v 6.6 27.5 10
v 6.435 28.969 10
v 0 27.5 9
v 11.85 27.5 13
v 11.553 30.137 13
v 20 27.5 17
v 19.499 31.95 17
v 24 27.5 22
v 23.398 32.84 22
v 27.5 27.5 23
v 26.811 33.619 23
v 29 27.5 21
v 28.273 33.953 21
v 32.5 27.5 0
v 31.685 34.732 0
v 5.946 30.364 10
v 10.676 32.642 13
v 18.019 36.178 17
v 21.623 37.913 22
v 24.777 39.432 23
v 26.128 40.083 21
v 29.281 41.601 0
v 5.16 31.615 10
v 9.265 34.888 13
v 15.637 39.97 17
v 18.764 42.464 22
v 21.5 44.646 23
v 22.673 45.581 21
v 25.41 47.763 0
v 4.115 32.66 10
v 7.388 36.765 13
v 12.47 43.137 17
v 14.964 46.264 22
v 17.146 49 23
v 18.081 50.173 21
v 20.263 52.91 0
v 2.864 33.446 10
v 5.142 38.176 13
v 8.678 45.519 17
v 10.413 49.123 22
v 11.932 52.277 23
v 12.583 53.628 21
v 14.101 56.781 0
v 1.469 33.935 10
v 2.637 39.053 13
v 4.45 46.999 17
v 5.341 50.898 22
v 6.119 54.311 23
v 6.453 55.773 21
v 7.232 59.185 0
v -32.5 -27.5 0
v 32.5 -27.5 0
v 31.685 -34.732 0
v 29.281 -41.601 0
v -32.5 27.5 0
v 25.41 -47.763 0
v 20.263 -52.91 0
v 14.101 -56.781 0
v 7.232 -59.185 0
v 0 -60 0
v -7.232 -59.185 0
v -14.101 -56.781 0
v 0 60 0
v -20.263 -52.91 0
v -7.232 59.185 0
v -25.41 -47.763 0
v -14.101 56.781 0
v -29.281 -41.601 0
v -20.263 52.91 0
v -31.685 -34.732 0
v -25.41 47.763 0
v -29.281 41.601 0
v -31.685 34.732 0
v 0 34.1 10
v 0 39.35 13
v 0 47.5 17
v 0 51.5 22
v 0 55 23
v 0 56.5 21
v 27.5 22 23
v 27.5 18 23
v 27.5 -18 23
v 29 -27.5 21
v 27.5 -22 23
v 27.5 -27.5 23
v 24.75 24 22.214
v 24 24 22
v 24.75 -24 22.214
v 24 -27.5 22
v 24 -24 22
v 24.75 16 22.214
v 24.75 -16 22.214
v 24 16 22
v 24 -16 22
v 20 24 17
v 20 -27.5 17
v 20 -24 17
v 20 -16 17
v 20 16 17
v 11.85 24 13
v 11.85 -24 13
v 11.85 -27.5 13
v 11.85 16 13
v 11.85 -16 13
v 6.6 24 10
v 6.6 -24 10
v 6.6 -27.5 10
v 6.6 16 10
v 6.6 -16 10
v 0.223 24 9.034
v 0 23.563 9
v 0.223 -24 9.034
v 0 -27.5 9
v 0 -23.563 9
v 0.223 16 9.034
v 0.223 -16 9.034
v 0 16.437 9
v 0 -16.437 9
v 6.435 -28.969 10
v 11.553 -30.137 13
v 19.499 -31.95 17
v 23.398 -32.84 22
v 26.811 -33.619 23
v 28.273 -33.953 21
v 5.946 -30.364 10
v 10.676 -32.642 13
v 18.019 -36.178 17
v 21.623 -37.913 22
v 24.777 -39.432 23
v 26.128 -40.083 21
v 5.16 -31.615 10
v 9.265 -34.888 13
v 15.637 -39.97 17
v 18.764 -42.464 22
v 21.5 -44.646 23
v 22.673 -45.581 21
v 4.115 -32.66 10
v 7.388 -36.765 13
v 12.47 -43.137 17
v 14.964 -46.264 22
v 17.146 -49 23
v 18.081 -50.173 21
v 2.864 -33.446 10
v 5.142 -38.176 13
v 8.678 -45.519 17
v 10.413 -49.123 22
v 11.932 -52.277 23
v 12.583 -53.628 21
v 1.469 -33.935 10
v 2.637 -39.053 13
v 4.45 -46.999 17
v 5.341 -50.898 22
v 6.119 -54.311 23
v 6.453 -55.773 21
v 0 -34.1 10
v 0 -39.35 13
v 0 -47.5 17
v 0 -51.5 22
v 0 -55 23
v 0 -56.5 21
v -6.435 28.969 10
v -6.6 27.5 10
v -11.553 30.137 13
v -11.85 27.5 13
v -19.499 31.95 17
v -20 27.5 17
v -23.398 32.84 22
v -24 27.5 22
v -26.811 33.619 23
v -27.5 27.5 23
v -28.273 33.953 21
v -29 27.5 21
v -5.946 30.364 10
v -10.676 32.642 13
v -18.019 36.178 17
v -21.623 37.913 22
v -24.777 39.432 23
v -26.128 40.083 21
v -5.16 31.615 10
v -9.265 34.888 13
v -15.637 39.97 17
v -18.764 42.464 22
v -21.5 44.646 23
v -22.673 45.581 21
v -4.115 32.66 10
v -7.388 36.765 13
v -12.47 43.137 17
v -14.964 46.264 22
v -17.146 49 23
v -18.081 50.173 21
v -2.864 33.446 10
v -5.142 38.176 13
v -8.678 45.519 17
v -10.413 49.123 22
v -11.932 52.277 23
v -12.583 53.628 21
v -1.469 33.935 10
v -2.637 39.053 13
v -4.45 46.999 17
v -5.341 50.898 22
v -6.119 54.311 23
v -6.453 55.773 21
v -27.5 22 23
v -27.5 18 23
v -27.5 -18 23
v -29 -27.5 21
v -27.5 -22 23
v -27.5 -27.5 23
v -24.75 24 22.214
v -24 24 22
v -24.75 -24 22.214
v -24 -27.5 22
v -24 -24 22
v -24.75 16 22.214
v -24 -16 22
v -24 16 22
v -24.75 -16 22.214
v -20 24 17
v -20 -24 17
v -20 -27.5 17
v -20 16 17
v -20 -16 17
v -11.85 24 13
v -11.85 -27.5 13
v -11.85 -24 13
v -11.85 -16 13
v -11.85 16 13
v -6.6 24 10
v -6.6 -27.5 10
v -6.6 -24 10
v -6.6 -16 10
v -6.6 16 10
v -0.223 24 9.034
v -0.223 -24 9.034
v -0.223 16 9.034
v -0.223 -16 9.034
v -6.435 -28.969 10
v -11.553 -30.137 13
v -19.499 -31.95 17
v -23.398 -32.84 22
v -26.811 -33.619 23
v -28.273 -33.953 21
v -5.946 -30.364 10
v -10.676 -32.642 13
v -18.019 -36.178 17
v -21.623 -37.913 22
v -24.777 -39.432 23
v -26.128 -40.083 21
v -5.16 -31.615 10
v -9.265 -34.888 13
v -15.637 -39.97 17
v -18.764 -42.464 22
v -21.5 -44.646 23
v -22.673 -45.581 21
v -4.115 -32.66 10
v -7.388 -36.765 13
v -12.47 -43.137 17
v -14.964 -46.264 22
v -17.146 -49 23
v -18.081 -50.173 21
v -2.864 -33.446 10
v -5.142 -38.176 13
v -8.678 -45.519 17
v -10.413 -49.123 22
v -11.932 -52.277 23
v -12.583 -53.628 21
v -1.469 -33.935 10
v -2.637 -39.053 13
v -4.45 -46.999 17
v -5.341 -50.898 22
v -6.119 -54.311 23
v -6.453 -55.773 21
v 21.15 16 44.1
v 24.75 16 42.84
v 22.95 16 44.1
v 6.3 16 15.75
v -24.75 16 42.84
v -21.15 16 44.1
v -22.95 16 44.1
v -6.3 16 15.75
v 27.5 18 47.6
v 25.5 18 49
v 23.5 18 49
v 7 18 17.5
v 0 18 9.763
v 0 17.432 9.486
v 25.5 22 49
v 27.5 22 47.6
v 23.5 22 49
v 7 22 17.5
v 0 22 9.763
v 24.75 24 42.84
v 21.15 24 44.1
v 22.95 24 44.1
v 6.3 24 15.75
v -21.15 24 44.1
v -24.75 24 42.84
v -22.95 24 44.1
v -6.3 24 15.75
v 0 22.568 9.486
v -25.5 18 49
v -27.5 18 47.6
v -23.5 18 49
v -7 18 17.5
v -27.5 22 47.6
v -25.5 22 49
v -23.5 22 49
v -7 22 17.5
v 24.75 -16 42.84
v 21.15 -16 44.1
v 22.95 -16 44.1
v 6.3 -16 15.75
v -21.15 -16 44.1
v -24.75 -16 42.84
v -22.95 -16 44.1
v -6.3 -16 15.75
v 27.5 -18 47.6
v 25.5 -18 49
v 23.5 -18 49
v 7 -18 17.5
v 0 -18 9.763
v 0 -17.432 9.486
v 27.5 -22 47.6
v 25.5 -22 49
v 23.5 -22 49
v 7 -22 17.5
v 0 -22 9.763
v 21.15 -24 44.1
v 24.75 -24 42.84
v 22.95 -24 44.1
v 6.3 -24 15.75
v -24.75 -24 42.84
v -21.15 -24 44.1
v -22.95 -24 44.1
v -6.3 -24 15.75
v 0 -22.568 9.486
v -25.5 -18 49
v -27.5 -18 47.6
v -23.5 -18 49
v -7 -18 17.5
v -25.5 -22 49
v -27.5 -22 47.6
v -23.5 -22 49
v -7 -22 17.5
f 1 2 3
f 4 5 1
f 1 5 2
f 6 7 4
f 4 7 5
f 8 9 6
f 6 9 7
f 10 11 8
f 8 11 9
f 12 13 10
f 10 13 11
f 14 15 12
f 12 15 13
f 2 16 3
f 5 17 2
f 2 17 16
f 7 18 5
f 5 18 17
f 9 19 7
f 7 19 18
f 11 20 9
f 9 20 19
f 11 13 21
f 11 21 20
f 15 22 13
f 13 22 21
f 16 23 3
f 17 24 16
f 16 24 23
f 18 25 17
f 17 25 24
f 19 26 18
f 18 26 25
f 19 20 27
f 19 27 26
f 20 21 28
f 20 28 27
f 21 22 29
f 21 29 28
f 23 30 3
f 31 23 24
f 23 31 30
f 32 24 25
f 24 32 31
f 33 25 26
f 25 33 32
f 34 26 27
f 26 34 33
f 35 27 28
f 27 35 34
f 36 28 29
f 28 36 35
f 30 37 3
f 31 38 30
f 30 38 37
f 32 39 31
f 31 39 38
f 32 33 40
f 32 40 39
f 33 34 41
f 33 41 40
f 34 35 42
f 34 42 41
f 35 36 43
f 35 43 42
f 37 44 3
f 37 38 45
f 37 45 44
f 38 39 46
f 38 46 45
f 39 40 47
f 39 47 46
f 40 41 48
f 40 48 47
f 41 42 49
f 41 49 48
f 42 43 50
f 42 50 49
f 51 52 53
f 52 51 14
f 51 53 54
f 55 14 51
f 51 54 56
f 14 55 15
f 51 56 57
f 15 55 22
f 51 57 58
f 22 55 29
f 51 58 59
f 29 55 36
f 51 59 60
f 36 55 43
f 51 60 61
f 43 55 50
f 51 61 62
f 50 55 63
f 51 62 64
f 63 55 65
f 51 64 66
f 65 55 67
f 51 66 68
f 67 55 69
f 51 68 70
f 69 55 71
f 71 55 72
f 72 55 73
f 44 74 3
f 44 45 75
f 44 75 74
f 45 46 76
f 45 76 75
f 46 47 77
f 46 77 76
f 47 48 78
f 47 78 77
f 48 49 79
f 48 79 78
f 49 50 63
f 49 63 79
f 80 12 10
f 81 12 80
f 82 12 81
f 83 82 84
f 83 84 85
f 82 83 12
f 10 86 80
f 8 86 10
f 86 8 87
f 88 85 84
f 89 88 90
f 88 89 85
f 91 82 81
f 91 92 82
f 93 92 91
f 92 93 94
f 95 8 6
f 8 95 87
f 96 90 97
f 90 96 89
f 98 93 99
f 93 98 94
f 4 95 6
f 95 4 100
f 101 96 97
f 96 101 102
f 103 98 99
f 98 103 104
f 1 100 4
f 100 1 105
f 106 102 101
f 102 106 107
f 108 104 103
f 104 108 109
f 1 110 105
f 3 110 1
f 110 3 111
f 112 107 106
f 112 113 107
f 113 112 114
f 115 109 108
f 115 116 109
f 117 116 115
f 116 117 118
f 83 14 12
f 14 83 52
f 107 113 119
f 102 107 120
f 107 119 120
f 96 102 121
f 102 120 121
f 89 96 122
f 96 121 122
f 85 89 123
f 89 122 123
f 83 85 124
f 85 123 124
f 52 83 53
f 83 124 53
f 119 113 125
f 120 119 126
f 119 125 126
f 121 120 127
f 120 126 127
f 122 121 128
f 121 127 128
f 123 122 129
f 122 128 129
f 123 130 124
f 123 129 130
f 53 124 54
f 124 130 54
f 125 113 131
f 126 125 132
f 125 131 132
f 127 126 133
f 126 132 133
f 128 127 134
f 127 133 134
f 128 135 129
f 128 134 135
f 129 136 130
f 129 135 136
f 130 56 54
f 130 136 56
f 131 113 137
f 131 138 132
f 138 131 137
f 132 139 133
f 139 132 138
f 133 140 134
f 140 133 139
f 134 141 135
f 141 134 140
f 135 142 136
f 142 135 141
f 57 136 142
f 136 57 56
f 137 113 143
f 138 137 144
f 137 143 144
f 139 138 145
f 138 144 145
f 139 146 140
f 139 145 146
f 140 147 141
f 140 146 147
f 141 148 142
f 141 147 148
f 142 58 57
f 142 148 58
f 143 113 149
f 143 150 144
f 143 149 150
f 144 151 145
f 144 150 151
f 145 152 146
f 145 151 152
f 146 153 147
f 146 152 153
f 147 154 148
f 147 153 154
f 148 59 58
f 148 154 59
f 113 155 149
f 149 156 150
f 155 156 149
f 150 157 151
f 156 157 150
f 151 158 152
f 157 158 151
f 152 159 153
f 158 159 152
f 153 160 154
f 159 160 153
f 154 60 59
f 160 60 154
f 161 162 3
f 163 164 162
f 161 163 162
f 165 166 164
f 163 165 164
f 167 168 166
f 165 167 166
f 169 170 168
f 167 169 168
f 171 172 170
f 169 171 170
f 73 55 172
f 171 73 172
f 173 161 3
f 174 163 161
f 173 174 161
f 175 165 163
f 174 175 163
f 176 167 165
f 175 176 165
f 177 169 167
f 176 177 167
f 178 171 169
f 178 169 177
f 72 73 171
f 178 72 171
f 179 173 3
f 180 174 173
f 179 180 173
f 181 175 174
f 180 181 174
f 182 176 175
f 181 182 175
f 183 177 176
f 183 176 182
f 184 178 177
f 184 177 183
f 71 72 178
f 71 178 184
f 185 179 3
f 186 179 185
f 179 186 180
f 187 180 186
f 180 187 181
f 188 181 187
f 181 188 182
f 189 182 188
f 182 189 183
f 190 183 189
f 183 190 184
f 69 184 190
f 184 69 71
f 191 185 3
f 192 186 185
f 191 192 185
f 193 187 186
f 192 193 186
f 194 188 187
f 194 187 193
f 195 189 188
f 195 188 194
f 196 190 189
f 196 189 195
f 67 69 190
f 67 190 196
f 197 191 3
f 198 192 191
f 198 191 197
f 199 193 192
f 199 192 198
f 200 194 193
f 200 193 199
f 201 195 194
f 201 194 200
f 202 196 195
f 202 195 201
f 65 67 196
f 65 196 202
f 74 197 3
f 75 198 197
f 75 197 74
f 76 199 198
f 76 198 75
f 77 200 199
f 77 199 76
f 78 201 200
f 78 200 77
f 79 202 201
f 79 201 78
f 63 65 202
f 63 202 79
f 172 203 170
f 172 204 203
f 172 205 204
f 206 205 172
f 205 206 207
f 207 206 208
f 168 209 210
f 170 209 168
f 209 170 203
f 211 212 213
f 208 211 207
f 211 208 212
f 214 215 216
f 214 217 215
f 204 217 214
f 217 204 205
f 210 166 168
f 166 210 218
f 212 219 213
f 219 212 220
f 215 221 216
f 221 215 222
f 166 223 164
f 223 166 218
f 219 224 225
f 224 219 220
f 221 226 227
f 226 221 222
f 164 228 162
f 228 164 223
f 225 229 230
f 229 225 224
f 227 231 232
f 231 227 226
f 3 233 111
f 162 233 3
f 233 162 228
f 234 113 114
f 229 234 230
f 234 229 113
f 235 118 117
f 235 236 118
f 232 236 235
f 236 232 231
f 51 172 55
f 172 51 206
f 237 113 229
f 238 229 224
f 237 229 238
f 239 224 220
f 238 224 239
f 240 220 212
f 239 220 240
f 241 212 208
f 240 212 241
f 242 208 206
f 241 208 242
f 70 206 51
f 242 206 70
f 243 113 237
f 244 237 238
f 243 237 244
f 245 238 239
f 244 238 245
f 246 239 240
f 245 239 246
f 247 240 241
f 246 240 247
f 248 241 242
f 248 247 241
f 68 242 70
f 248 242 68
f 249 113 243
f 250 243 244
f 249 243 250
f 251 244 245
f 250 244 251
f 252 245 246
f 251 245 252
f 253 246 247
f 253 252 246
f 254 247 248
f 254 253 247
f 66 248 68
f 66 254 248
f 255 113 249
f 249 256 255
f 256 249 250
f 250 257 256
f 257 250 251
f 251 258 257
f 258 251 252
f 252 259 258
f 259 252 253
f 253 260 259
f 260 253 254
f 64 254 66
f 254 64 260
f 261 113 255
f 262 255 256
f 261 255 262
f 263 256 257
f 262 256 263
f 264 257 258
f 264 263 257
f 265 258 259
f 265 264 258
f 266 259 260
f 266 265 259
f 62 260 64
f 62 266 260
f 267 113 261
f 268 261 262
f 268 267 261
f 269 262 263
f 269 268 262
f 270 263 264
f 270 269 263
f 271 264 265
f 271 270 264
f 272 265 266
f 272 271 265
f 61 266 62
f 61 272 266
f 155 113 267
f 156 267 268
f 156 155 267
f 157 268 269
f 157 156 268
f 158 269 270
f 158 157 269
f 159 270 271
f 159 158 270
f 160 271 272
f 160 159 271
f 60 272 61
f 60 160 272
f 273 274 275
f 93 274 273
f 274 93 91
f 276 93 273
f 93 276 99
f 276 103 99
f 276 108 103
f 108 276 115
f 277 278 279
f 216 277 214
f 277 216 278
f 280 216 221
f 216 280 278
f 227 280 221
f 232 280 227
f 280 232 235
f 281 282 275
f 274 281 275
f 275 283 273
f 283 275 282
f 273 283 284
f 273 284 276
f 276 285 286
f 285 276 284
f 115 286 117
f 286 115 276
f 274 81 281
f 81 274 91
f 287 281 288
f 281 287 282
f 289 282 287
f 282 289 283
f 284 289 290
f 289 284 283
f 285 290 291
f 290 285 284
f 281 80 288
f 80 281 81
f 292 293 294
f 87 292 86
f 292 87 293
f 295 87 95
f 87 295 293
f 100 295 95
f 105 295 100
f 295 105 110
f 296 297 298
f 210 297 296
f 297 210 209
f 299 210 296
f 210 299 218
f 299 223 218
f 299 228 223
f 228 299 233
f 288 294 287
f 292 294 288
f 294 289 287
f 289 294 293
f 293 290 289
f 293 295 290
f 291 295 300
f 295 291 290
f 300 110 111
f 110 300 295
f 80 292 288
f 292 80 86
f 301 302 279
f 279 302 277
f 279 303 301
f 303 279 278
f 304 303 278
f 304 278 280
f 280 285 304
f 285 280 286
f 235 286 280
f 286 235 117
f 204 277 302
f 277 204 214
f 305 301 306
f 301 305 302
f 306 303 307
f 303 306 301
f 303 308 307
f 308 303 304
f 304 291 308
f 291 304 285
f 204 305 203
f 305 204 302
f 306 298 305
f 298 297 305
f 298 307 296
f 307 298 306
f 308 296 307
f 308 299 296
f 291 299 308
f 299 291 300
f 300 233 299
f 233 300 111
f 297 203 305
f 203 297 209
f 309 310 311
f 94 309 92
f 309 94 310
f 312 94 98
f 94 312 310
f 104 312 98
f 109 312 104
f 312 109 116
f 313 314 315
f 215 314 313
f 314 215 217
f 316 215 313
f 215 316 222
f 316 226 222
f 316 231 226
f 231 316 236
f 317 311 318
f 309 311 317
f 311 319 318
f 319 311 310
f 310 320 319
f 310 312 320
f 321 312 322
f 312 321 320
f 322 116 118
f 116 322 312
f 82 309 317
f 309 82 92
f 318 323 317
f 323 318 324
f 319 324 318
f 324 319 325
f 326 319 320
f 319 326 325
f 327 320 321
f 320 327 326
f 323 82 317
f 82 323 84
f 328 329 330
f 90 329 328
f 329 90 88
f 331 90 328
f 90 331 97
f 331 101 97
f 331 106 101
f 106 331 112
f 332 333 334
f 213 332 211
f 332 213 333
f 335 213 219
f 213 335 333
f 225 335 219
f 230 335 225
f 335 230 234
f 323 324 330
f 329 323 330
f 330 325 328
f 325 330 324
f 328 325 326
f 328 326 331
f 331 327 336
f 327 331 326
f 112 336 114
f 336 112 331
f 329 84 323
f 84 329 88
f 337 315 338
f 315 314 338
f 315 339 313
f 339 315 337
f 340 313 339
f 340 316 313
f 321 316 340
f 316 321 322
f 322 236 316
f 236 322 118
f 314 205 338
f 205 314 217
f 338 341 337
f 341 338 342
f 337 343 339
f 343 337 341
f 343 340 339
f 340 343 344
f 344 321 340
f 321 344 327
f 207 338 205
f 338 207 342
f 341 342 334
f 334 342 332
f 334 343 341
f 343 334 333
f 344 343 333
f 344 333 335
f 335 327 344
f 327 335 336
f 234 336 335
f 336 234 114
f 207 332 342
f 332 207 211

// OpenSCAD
// Soap dish https://www.thingiverse.com/thing:4319245
// By David Phillip Oster. Creative Commons License.
// Version 1.0 4/27/2020
// TODO: the chamfer on the ridge faces that touch the soap are too subtle.
// The base is probably thicker than it needs to be.

// The diameter of the circle at the base.
bigDia = 65;

// Total length of the dish at the base.
bigLength = 120;

// The diameter of the circle measured at the top of base.
topDia = 58;

// The height of the base.
baseHeight = 18;

module crosSectionBase(){
  polygon([[0, 0],[32.5, 0],[29, 21],[27.5, 23],[24, 22],[20, 17],[11.85, 13],[6.6, 10],[0, 9]]);
}

module quarterBase(){
  translate([0, (bigLength-bigDia)/2, 0]){
    rotate_extrude(angle=90, convexity=2){
      crosSectionBase();
    }
  }
  translate([0, (bigLength-bigDia)/2, 0]) {
    rotate([90, 0, 0]){
      linear_extrude(height=(bigLength-bigDia)/2){
        crosSectionBase();
      }
    }
  }
}

module halfBase(){
  quarterBase();
  mirror([0,1,0])quarterBase();
}

module fullBase(){
  halfBase();
  mirror([1,0,0])halfBase();
}

// Cross section of the projection that holds the soap.
module ridge(){
  translate([-2.5, 7]){
    polygon([ [0,0], [30, 0], [30, 40.6], [28, 42], [26, 42],  [9.5, 10.5] ]);
  }
}

// extrude above Z, with a translated up smaller one as a chamfer.
module sixteenthRidge(){
  translate([0, 0, 2]){
    linear_extrude(height=2, scale=0.9, convexity=3){
      ridge();
    }
  }
  linear_extrude(height=2, convexity=3) {
    ridge();
  }
}

// mirror in Z - one full ridge.
module eighthRidge(){
  sixteenthRidge();
  mirror([0,0,1]){sixteenthRidge(); }
}

// flip up into place.
module quarterRidge(){
  translate([0, bigLength/6, 0]){
    rotate([90, 0, 0]){
      eighthRidge();
    }
  }
}

// Now there are two of them.
module halfRidge(){
  quarterRidge();
  mirror([1, 0, 0]){quarterRidge();}
}

// All four.
module fullRidge(){
  halfRidge();
  mirror([0, 1, 0]){halfRidge();
  }
}

module soapDish(){
  fullBase();
  fullRidge();
}

soapDish();
